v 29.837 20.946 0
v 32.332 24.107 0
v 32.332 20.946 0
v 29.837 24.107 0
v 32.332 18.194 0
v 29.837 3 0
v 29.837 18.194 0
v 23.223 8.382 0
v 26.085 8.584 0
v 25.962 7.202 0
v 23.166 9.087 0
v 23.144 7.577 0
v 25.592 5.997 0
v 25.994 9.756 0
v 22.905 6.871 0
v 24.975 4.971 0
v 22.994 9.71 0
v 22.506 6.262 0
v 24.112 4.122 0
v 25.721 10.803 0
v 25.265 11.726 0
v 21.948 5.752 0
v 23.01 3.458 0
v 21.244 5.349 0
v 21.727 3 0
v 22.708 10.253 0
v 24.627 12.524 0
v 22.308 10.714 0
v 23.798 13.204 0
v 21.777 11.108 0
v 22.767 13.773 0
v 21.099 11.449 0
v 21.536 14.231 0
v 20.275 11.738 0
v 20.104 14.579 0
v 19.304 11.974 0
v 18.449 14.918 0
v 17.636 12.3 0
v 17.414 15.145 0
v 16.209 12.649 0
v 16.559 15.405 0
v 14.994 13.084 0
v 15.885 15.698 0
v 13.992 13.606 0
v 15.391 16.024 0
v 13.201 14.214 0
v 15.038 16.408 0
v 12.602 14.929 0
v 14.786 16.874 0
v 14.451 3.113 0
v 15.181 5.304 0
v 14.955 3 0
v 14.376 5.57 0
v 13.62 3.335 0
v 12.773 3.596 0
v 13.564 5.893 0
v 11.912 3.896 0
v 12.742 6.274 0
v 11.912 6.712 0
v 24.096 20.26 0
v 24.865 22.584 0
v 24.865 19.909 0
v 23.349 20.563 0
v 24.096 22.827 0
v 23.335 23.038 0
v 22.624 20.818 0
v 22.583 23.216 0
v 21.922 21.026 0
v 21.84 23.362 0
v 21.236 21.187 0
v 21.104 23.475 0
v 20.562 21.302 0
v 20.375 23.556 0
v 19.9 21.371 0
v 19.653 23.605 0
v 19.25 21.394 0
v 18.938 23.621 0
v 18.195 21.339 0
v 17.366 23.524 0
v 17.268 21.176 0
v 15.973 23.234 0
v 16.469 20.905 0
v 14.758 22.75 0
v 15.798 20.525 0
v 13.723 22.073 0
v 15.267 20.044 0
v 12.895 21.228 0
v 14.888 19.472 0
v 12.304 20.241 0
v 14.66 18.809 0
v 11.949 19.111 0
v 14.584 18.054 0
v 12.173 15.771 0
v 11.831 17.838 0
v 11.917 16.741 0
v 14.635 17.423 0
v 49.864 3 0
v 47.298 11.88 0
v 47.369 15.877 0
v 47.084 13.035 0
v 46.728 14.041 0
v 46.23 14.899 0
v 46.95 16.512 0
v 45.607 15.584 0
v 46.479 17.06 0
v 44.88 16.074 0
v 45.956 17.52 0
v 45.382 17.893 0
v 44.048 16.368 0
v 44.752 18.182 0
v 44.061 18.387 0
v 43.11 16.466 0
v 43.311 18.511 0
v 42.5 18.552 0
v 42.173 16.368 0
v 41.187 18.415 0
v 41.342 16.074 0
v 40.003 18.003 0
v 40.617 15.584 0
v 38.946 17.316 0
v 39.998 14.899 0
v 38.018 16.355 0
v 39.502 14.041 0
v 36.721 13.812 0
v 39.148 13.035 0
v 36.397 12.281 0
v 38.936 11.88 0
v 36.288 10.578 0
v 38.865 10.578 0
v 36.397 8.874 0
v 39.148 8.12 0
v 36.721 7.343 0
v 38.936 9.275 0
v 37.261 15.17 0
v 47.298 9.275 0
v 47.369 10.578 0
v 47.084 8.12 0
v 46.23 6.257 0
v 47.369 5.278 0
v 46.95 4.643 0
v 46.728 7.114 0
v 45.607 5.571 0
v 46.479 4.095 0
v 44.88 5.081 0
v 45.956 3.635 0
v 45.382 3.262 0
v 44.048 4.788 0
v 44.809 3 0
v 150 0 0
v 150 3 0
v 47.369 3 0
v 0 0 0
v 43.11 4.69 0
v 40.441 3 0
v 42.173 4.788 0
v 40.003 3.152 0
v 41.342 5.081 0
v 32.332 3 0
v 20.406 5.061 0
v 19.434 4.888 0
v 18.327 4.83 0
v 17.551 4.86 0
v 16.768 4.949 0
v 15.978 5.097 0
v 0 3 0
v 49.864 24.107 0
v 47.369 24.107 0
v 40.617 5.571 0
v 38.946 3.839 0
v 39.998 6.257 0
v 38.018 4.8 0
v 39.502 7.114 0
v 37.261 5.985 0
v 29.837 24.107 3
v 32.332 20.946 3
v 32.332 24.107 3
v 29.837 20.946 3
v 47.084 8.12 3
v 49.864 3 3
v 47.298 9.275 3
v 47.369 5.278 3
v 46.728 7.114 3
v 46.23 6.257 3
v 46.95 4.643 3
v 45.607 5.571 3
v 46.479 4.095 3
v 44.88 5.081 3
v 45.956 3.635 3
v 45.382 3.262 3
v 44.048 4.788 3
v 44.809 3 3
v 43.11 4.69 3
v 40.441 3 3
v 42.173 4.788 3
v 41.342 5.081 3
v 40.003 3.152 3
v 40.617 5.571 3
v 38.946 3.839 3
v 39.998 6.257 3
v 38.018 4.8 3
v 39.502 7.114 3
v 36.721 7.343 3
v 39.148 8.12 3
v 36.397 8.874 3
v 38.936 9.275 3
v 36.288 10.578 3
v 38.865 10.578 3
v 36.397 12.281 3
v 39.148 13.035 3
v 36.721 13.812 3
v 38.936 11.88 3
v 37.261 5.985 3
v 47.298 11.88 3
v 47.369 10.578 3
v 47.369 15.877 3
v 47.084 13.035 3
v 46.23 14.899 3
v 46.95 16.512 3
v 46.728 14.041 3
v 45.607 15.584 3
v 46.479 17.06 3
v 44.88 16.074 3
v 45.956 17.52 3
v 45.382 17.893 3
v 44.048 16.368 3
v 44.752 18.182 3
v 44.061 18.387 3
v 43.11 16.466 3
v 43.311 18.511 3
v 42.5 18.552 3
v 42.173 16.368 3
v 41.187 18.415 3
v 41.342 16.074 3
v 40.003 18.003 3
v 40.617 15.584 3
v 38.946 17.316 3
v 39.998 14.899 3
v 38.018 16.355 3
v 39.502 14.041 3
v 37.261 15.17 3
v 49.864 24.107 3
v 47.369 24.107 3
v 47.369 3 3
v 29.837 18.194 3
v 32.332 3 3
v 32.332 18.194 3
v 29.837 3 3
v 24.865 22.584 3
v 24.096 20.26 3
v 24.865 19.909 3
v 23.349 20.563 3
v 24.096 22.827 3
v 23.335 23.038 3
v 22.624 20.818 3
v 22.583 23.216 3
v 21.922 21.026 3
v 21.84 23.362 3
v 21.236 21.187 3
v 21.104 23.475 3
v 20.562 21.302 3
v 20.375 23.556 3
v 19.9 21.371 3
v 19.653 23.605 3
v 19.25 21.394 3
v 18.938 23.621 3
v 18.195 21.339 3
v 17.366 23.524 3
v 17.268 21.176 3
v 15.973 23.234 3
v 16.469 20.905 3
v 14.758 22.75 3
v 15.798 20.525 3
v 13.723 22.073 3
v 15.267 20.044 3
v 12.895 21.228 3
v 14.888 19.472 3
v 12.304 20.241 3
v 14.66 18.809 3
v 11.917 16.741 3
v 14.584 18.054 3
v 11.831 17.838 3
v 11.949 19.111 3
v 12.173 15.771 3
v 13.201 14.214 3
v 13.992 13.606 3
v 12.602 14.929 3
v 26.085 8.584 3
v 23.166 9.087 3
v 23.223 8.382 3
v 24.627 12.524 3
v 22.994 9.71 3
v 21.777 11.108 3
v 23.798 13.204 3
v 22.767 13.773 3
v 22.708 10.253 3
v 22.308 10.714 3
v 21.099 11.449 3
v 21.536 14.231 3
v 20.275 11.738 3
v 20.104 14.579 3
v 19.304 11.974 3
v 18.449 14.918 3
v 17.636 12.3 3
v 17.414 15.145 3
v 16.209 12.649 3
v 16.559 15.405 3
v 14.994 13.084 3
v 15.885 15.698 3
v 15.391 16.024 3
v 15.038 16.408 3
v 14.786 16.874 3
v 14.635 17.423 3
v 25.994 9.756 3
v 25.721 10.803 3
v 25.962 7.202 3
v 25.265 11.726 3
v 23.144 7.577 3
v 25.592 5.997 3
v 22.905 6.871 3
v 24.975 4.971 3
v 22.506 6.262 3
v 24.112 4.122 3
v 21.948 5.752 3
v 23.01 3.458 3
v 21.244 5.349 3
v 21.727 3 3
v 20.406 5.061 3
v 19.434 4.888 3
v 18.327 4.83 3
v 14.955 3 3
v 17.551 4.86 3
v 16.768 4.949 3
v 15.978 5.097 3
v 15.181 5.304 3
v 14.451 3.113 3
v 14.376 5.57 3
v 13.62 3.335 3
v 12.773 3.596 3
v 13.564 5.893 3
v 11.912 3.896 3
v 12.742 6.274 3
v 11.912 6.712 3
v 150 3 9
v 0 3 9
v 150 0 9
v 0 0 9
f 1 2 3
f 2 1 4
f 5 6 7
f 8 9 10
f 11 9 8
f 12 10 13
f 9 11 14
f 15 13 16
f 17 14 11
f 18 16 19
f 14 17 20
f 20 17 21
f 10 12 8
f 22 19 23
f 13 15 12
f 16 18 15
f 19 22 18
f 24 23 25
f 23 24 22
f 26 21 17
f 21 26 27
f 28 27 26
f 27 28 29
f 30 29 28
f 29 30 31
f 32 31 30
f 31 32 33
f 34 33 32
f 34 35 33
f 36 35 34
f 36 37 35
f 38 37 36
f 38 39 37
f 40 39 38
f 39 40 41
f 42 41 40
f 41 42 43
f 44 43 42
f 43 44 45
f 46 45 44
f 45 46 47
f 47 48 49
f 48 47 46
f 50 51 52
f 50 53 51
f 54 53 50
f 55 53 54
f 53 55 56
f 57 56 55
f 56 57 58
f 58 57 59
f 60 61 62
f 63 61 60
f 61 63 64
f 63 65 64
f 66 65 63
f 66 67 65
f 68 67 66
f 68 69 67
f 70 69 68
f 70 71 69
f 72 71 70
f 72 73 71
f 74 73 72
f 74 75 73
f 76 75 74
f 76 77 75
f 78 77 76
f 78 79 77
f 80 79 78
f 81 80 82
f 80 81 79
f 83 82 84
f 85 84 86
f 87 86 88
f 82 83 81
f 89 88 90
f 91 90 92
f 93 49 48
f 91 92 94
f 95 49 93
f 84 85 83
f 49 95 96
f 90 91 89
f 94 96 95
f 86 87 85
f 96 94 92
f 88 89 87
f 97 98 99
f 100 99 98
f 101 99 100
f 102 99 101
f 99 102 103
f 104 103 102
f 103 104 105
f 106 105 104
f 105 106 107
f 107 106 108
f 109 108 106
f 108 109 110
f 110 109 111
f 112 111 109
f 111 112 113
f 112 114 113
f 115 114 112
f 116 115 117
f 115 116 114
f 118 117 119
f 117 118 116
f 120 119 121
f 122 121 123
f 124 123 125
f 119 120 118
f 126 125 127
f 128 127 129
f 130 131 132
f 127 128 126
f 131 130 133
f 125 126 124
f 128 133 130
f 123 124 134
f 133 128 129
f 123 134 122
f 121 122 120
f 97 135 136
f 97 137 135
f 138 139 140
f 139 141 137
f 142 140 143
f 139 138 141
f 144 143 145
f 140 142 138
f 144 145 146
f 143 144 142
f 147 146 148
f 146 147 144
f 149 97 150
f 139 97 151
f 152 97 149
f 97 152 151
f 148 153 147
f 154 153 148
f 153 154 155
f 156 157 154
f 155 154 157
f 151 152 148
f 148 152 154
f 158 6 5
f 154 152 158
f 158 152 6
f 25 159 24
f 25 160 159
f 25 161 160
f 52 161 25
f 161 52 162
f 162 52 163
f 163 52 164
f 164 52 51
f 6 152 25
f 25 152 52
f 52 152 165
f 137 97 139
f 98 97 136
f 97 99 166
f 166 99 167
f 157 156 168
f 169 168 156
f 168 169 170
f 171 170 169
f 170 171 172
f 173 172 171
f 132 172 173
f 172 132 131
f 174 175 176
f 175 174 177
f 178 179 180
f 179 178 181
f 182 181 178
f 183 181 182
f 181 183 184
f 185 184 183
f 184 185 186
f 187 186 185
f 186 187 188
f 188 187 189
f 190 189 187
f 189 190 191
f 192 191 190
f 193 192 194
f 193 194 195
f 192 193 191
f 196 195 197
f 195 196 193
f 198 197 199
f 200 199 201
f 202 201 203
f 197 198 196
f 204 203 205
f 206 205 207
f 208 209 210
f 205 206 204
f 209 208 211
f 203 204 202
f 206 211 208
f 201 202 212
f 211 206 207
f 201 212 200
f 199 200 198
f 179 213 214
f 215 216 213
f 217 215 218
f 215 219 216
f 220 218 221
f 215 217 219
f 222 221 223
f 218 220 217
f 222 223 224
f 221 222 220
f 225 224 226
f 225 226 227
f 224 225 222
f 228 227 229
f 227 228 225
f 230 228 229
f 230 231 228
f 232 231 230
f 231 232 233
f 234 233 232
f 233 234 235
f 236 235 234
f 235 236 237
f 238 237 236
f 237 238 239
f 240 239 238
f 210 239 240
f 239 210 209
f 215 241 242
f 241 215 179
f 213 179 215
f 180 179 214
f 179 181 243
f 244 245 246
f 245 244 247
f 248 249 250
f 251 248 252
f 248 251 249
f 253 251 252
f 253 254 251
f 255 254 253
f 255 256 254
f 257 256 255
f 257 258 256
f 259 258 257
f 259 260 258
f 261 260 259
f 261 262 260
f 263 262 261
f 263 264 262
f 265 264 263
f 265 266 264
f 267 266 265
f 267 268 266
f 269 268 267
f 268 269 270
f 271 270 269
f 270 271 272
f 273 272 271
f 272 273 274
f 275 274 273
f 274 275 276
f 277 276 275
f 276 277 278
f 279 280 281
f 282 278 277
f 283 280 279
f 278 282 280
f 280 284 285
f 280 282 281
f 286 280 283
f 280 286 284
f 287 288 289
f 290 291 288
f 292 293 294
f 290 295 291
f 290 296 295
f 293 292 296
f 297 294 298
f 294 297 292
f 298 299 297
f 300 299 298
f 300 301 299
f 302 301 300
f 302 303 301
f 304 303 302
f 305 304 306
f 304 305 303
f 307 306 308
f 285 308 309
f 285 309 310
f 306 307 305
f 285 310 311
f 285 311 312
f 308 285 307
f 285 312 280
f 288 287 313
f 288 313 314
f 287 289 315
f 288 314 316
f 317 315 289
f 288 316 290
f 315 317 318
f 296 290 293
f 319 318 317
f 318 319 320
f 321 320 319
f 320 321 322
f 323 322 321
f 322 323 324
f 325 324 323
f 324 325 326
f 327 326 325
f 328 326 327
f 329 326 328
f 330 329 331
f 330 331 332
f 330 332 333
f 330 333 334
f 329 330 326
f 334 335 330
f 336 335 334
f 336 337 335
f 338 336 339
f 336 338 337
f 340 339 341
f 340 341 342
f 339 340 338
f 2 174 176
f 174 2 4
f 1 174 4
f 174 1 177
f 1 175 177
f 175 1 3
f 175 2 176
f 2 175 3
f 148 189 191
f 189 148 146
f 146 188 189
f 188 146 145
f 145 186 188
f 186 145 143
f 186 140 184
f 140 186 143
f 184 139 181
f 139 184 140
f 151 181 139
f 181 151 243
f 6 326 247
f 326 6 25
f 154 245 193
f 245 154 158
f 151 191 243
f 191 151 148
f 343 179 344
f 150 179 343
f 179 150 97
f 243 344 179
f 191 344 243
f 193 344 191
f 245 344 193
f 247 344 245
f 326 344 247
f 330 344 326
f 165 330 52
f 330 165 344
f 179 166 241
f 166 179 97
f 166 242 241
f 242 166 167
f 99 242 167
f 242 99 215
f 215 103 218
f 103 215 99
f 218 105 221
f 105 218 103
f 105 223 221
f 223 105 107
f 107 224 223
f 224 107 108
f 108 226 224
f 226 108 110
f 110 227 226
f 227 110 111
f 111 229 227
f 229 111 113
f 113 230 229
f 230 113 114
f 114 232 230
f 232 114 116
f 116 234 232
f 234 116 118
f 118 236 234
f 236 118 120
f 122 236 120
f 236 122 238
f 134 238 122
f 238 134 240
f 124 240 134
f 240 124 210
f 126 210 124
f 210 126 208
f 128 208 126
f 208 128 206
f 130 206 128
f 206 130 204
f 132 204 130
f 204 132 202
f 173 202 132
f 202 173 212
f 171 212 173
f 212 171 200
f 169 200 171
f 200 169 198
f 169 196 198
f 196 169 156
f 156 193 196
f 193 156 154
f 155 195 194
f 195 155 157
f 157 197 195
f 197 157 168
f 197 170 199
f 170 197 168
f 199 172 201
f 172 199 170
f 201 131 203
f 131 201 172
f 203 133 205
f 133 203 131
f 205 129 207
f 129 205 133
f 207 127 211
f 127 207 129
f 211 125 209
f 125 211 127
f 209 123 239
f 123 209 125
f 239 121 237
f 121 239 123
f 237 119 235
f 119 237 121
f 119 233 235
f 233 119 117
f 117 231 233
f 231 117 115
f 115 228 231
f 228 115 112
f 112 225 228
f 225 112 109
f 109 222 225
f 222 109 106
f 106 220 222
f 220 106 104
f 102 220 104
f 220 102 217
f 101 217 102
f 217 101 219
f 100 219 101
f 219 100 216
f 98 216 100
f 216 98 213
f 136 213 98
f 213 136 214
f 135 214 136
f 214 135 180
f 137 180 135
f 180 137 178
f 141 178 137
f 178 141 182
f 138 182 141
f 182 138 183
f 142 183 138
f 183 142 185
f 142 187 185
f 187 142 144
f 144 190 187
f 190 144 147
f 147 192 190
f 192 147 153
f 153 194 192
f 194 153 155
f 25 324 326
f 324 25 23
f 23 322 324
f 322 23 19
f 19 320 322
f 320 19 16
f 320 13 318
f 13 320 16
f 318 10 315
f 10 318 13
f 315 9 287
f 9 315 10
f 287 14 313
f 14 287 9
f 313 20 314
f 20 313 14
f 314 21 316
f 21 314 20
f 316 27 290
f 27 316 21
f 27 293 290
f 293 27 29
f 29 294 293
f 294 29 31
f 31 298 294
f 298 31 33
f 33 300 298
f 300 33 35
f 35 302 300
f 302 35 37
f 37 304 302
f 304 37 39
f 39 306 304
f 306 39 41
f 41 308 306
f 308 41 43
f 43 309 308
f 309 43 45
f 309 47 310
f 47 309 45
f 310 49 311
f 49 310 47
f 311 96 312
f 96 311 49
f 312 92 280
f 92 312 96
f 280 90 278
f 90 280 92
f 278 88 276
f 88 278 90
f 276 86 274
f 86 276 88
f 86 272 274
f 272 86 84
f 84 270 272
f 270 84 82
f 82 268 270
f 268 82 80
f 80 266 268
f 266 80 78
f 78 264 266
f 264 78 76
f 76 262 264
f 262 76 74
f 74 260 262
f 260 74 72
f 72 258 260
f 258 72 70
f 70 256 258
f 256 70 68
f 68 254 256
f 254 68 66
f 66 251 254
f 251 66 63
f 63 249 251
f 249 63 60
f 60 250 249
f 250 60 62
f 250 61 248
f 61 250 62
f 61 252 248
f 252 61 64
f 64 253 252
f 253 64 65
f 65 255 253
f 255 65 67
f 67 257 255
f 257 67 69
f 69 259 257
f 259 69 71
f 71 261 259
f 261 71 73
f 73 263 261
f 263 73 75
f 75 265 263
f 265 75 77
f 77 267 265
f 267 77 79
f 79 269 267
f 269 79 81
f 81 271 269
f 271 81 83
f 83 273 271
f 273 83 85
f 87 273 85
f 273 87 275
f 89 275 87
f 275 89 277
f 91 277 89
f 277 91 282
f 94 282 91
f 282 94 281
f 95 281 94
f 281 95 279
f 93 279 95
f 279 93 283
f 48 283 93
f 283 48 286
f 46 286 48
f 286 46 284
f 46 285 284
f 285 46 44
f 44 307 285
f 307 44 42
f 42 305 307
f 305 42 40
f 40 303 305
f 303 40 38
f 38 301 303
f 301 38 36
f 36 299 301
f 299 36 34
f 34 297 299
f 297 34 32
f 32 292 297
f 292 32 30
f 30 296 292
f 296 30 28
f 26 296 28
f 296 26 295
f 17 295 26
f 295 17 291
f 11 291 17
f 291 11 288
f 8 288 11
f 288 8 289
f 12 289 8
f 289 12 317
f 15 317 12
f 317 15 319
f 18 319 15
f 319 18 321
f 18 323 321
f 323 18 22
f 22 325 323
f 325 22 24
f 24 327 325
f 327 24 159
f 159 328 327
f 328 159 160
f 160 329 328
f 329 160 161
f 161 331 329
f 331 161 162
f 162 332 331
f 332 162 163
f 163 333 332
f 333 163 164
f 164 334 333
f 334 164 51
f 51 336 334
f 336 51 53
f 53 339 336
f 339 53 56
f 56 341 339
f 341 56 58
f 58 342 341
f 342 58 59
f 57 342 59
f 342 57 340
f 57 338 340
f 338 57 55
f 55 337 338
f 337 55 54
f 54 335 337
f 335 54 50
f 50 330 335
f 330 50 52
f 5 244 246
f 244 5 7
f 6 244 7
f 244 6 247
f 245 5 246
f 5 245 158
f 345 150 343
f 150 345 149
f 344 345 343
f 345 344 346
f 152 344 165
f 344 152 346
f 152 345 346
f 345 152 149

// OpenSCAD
translate([10, 3, 0])
linear_extrude(height=3)
    text("Sid", 20, "Cascadia Code Semibold");

cube([150, 3, 9]);
